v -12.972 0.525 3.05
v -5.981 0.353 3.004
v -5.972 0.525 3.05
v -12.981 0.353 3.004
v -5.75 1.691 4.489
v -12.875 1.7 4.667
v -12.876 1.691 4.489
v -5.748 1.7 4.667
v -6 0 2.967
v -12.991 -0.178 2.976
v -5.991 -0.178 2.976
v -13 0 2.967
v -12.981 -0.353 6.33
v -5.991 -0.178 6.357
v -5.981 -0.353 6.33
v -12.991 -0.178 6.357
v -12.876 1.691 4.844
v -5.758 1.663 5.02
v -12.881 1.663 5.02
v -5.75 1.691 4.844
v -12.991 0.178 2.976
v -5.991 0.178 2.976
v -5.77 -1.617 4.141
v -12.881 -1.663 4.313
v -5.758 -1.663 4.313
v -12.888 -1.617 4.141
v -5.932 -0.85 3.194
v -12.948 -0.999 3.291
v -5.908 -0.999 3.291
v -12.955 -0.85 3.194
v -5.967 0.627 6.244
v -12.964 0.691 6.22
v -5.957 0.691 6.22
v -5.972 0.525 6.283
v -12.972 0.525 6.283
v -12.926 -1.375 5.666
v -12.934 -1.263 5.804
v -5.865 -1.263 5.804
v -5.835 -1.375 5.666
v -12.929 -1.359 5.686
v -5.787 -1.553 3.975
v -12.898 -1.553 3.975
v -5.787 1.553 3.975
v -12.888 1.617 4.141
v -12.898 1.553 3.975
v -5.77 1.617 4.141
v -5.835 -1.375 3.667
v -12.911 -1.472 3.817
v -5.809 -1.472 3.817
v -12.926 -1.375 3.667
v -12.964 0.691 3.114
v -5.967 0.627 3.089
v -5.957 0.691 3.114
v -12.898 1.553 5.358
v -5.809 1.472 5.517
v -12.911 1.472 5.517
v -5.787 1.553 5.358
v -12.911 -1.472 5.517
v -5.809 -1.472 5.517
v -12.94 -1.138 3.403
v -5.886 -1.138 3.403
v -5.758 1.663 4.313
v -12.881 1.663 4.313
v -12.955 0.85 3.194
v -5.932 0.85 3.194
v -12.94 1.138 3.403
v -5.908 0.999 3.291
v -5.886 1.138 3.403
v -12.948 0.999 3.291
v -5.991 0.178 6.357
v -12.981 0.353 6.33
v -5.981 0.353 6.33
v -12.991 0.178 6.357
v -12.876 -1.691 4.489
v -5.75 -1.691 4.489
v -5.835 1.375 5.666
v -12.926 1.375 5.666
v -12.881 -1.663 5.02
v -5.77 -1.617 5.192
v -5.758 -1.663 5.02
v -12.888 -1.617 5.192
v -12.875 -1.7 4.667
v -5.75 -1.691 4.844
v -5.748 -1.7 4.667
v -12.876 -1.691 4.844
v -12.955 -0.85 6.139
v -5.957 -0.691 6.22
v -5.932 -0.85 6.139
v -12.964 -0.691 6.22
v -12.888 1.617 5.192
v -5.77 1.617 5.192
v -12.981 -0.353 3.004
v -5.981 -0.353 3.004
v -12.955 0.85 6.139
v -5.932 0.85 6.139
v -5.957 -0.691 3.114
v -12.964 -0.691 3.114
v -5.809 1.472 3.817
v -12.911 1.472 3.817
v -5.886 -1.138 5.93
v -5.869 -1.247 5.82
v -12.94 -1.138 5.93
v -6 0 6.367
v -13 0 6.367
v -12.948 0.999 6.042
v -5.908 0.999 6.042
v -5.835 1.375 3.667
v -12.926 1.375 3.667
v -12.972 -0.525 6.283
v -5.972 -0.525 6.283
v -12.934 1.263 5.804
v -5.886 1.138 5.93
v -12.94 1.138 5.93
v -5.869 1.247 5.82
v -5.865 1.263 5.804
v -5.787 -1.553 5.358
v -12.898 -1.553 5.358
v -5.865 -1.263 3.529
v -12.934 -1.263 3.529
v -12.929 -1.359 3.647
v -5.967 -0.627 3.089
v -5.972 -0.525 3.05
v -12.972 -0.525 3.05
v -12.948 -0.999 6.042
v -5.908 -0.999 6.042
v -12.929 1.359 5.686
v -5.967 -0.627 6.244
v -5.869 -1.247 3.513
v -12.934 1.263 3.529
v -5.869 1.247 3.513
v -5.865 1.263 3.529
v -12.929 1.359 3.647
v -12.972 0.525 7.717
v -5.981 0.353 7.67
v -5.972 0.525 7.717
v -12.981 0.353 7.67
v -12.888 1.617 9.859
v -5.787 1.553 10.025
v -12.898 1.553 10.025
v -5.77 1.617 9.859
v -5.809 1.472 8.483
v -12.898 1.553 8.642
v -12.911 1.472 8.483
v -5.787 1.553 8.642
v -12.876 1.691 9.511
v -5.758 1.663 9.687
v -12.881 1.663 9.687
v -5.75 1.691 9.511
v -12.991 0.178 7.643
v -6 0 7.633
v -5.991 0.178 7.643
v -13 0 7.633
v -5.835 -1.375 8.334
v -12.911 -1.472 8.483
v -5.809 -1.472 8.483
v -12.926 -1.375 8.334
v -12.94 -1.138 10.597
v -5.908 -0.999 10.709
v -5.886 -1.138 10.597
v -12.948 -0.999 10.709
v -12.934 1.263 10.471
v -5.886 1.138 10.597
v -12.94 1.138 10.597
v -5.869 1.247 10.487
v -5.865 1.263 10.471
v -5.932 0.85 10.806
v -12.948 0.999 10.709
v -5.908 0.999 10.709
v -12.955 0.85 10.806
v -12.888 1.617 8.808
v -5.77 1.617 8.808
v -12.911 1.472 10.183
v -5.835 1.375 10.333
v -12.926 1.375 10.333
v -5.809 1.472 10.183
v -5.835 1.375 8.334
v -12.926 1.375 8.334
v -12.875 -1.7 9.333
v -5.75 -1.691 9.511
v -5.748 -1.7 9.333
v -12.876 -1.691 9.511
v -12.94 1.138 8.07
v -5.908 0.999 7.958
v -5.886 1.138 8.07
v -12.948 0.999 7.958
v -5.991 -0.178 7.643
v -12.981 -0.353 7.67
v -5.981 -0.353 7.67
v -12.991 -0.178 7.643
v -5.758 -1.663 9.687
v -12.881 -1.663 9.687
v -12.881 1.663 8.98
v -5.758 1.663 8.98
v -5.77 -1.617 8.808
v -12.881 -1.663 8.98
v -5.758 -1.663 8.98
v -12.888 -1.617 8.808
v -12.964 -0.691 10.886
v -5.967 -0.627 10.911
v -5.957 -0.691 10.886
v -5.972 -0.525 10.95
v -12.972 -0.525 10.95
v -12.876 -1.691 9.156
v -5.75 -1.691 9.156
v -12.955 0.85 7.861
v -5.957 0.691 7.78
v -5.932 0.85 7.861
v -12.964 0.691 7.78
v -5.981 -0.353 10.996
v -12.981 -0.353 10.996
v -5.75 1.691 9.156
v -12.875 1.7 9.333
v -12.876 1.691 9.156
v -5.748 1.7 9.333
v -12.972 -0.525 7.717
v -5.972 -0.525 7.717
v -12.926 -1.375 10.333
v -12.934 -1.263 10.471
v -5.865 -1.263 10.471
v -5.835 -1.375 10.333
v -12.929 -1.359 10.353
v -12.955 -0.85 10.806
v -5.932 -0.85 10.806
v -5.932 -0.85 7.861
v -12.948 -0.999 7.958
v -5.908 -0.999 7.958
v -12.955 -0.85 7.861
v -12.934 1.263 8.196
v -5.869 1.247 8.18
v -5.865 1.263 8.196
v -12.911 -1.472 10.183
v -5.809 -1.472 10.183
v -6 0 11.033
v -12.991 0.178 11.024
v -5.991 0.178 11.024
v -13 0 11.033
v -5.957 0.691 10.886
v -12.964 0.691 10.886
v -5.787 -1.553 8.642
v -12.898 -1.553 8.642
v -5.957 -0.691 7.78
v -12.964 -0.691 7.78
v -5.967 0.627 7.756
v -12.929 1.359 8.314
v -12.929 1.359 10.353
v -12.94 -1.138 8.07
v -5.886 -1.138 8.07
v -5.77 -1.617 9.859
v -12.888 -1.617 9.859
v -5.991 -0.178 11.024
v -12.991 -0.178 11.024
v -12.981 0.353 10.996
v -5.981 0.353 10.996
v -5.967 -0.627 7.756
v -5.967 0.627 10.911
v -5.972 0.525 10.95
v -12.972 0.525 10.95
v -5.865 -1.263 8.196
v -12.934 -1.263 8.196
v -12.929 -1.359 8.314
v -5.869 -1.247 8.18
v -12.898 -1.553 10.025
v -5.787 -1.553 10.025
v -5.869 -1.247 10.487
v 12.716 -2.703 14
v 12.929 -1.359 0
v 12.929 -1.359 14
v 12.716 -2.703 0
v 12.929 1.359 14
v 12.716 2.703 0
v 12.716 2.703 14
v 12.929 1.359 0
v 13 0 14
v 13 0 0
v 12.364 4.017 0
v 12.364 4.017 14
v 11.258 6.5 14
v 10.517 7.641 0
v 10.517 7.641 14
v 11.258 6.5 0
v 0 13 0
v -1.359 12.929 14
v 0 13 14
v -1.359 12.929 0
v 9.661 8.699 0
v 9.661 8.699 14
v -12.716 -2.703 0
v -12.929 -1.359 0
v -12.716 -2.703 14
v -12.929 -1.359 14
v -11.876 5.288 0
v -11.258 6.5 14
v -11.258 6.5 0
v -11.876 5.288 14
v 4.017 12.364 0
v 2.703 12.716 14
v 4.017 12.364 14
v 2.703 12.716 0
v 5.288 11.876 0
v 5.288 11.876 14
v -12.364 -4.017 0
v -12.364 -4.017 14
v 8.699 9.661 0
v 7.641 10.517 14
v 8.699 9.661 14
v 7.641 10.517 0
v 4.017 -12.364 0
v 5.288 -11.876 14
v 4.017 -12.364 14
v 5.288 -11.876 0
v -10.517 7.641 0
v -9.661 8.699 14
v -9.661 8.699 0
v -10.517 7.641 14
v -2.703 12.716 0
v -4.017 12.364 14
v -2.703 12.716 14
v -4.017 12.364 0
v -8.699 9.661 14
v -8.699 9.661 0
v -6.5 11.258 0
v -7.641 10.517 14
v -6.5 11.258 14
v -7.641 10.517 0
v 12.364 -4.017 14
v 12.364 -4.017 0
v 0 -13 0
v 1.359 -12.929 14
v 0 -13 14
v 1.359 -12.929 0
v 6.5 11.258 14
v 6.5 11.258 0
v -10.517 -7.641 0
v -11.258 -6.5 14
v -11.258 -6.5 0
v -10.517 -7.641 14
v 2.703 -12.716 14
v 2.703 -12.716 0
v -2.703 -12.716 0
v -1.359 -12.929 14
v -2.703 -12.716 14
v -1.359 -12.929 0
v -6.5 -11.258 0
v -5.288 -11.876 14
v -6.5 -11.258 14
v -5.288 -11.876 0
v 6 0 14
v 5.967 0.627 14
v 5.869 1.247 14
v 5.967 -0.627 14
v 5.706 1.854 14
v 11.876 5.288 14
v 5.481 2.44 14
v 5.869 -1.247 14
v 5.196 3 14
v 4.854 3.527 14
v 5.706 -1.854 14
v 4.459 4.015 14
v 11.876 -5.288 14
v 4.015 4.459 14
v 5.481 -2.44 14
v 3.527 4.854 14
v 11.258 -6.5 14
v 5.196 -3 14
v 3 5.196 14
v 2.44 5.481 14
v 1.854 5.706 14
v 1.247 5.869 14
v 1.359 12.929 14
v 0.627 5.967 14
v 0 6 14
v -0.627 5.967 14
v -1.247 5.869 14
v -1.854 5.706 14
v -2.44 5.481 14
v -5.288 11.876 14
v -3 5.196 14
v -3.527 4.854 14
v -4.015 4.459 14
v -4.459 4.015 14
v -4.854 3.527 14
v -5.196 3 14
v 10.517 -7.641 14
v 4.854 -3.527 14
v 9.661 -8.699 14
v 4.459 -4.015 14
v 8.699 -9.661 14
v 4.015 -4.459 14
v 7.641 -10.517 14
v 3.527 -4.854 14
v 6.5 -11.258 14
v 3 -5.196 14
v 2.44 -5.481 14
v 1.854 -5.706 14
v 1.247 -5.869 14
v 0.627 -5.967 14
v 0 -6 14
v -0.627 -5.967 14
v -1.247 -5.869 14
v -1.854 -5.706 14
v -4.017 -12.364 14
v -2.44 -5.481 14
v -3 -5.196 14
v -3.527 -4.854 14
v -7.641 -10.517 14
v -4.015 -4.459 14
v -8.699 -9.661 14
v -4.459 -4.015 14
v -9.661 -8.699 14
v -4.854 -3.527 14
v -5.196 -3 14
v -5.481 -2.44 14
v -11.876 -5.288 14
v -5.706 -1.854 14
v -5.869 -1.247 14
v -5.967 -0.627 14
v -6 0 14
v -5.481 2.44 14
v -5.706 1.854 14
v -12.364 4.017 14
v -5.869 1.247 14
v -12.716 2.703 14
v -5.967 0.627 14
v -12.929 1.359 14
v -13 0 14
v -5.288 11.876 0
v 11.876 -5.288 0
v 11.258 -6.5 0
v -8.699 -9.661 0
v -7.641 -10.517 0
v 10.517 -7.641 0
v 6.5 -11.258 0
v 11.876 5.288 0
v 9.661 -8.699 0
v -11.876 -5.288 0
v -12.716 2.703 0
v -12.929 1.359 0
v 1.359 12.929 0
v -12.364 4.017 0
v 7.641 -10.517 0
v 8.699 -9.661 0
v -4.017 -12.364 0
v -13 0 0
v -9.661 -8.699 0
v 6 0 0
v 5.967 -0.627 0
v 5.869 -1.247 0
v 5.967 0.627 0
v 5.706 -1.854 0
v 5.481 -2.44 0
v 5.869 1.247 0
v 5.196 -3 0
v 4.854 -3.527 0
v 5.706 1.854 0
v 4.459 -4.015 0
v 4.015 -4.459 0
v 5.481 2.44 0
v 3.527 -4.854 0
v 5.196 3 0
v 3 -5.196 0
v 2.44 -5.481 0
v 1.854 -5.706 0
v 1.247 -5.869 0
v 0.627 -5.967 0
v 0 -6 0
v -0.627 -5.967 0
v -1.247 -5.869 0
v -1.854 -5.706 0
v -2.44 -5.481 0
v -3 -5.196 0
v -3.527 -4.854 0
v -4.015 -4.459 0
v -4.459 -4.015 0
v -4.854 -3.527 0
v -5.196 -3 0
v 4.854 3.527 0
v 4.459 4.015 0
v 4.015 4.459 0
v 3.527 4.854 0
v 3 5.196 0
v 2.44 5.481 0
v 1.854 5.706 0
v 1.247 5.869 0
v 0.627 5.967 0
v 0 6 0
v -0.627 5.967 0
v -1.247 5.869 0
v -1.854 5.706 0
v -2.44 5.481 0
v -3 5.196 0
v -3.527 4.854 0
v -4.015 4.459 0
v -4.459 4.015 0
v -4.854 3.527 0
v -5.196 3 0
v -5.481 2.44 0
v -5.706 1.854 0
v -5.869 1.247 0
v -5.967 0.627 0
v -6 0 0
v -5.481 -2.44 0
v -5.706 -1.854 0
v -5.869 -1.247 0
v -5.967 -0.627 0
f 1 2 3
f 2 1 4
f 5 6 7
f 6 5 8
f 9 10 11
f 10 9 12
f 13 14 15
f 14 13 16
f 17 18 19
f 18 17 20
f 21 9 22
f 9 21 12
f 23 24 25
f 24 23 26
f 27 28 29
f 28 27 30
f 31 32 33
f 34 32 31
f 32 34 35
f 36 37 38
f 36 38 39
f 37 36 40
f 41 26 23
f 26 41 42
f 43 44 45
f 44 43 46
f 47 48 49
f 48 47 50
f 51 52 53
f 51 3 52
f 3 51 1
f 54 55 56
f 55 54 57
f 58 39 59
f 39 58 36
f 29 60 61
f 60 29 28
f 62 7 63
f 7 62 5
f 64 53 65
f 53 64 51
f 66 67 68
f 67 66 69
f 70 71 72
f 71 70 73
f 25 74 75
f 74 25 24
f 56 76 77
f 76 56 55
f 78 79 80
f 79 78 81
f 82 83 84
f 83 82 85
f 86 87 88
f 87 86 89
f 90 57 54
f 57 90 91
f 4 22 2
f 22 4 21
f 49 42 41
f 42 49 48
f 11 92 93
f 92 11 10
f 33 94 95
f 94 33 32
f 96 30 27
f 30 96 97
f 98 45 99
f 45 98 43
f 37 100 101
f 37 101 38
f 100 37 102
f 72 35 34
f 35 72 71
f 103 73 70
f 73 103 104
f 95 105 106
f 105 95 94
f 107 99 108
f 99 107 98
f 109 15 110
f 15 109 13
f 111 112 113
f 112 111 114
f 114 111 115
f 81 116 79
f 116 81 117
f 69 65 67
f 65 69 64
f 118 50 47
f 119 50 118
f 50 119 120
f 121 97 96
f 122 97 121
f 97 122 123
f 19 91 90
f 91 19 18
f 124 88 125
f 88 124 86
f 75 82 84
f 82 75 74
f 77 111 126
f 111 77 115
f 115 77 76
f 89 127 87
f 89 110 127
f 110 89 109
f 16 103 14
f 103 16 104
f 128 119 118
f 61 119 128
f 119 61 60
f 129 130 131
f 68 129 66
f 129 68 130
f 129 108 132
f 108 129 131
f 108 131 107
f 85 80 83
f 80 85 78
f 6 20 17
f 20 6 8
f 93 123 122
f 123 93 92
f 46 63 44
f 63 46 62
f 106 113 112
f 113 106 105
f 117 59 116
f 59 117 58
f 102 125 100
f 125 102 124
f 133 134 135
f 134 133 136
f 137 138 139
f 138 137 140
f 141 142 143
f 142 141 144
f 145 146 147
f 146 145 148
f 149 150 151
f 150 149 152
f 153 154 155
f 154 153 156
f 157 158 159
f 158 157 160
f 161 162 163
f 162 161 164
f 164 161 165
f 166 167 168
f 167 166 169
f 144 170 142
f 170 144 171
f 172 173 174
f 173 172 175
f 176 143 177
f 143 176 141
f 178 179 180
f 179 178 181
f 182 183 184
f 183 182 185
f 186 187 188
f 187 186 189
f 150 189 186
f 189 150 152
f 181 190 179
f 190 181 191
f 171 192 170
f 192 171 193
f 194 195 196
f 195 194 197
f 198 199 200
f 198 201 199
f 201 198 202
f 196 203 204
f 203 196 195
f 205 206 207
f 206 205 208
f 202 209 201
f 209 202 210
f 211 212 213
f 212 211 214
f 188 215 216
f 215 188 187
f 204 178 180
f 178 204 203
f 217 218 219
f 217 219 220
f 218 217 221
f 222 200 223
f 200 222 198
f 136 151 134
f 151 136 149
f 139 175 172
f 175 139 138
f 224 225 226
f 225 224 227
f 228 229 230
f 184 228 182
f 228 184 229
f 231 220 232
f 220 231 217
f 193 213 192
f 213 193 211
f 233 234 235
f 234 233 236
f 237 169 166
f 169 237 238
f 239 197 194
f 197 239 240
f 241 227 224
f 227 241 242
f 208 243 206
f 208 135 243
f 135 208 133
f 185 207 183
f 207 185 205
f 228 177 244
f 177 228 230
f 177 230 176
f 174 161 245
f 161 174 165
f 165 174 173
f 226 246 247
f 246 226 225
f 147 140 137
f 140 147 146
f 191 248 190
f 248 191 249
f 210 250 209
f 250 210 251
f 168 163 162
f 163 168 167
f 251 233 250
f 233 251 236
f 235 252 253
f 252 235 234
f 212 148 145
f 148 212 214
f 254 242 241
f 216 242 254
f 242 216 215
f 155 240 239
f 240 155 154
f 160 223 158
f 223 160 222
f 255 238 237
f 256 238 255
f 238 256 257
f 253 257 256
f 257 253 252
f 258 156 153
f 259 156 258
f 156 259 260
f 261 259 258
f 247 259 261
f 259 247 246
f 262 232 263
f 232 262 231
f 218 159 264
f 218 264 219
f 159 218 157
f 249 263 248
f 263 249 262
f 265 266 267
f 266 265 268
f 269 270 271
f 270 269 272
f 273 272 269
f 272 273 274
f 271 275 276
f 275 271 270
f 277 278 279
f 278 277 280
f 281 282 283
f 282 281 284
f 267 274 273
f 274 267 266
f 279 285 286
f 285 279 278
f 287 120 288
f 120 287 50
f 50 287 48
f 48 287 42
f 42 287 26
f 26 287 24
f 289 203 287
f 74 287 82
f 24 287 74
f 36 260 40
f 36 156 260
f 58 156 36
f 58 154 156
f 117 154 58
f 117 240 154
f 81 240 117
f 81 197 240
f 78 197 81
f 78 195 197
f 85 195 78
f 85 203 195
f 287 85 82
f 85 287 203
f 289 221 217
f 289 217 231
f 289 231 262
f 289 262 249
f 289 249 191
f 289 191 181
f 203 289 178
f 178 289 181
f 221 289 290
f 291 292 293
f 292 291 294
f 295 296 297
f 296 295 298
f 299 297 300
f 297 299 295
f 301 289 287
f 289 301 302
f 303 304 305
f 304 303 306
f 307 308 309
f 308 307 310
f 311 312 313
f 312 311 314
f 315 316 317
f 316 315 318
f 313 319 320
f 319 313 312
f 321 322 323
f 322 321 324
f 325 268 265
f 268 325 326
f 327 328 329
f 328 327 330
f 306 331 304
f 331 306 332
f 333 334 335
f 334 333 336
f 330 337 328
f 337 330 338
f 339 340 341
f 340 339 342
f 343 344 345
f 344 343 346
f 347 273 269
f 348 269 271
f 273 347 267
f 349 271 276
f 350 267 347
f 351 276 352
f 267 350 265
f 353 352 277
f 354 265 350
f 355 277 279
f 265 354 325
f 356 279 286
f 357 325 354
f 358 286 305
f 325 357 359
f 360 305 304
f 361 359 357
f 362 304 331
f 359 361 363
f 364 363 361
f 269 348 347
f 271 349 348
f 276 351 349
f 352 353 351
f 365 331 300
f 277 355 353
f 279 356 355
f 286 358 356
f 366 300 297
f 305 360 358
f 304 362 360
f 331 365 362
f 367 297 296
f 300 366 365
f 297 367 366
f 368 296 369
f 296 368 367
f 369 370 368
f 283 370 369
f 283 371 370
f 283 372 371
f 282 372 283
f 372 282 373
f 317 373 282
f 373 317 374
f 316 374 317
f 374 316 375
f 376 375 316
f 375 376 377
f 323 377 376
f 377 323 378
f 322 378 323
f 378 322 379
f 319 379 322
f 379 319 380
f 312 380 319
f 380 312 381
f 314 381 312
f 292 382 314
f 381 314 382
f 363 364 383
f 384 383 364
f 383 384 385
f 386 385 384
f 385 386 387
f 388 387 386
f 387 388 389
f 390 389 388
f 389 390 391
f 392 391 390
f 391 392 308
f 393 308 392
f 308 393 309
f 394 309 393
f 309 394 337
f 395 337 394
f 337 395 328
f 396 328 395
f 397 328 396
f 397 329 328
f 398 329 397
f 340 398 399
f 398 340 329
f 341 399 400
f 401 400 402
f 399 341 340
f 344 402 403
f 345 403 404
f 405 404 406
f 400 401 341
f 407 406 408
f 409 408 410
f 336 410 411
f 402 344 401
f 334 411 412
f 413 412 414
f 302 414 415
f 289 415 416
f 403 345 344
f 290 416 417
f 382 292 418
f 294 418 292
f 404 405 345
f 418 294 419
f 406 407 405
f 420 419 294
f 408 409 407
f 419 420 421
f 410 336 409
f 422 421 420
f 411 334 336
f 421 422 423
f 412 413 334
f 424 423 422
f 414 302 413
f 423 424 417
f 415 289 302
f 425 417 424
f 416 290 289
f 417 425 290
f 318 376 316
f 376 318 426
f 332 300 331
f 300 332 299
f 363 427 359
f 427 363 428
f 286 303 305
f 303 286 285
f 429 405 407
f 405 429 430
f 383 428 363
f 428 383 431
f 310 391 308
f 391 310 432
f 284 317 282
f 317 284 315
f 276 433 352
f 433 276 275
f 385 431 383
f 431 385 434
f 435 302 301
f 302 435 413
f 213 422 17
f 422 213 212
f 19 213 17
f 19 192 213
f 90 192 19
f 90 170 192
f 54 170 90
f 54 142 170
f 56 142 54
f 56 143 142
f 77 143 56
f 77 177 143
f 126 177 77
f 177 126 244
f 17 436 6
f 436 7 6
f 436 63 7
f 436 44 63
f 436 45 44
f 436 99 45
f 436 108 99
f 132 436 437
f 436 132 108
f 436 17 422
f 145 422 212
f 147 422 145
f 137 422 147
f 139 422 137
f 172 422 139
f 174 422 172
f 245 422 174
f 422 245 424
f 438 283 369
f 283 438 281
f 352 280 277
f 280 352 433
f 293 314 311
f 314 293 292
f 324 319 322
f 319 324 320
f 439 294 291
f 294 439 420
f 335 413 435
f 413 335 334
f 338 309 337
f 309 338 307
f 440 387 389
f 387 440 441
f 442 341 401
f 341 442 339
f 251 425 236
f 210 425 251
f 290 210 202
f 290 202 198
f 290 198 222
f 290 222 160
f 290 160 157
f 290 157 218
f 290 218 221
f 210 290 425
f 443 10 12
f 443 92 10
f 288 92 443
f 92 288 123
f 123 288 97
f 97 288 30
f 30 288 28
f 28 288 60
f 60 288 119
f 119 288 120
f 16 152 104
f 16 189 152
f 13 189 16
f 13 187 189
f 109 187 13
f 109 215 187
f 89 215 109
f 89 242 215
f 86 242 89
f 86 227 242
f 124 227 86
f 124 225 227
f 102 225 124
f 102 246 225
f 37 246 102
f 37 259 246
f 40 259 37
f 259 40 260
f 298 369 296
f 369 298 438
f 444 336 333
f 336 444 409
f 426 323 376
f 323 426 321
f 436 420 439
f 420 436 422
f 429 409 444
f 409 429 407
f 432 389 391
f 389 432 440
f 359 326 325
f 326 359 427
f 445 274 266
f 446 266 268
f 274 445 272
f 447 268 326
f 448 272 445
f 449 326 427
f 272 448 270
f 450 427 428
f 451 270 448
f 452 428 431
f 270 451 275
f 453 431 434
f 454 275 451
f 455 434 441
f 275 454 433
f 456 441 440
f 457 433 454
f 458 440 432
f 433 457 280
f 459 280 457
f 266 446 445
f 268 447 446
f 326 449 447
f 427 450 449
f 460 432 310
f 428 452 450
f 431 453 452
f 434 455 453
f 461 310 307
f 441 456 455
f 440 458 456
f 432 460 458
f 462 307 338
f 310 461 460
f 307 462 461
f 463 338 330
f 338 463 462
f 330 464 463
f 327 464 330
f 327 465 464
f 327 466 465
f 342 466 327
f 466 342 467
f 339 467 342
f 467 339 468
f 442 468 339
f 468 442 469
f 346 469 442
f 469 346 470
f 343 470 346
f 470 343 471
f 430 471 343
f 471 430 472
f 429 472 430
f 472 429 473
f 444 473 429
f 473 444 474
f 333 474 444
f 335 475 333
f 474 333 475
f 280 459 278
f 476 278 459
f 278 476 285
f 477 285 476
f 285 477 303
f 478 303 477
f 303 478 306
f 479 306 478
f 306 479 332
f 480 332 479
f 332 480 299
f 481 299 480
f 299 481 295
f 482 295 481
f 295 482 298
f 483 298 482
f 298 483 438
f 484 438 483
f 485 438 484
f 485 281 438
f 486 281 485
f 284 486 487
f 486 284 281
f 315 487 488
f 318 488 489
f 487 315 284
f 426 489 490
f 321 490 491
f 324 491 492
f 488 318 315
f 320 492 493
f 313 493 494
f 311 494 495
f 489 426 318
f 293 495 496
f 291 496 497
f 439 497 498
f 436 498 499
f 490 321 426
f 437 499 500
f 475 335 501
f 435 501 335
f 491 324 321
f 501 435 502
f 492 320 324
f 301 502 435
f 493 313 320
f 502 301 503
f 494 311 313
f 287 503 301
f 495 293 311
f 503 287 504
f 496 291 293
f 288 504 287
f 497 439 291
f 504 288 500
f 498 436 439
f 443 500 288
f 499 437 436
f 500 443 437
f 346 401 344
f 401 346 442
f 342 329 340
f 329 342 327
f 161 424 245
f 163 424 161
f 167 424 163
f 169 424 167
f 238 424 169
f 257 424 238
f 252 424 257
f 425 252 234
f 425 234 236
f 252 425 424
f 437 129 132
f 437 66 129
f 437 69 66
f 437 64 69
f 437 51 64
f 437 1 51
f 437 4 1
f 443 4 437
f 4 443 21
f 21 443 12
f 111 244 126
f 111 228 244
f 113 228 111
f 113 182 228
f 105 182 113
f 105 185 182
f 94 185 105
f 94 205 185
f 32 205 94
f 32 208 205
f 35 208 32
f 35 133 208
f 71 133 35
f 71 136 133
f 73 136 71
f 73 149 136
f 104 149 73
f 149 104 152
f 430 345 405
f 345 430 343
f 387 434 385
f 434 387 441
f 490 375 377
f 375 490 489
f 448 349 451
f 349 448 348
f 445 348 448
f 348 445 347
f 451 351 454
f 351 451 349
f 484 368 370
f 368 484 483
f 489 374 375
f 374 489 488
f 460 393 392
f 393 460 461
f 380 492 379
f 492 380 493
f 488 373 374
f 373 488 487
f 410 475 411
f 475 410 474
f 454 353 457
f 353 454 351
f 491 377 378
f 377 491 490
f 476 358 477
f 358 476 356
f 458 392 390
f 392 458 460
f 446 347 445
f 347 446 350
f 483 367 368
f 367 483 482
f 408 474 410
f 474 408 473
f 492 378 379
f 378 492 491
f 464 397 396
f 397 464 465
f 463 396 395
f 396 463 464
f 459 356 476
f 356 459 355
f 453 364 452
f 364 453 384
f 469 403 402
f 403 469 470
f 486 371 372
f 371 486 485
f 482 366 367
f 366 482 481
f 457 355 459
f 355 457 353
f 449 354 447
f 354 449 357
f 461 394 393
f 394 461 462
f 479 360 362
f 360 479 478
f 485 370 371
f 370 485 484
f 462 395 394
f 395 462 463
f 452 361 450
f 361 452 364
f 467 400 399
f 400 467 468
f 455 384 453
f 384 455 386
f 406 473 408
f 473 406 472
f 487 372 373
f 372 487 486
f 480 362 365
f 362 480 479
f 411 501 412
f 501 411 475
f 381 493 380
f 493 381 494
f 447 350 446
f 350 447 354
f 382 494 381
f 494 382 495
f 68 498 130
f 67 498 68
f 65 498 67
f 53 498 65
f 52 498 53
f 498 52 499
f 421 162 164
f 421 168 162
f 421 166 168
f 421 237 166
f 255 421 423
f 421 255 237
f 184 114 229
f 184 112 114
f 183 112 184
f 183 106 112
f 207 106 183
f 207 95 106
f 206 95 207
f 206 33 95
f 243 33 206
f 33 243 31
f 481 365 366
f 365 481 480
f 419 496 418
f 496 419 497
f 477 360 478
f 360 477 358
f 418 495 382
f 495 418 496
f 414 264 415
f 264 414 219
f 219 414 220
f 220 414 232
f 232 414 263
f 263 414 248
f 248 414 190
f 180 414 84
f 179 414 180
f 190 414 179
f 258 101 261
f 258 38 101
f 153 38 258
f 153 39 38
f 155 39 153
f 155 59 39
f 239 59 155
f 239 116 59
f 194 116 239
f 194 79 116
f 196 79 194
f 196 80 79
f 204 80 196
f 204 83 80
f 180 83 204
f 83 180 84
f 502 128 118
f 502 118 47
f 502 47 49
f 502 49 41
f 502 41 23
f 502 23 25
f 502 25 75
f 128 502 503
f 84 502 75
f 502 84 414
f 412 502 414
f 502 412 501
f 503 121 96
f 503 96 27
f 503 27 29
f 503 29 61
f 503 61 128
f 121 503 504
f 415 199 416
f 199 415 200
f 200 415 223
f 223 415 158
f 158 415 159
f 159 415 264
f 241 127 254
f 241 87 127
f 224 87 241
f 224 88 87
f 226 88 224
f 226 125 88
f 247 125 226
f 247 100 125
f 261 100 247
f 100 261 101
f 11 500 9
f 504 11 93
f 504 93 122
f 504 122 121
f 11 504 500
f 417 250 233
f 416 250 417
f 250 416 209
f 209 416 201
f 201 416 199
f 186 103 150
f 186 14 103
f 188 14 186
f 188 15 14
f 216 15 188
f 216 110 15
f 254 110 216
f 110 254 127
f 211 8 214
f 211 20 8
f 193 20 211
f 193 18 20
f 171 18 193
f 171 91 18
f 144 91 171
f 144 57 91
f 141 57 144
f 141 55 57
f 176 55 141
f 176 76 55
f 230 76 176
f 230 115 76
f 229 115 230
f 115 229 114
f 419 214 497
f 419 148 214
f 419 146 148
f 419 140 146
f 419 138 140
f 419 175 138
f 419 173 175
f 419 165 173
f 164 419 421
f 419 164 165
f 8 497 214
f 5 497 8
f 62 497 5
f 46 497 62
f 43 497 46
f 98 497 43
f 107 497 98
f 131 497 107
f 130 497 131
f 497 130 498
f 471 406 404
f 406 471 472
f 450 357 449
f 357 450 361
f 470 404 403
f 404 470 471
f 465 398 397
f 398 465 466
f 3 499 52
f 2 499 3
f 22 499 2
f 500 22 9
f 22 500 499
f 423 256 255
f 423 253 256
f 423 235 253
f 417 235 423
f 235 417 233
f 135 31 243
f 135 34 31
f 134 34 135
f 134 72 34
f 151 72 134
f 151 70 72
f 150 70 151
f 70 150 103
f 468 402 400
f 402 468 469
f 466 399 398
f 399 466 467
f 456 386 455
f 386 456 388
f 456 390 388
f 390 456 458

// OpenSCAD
// Double-screw locking collar.
$fn = 60;
eps = 0.02;
shaft_d = 12;
outer_d = 26;
width = 14;
difference() {
    cylinder(d=outer_d,h=width);
    translate([0,0,-eps]) cylinder(d=shaft_d,h=width+2*eps);
    for (z=[width/3,2*width/3]) translate([-outer_d/2-eps,0,z]) rotate([0,90,0]) cylinder(d=3.4,h=outer_d/2+2*eps);
}
